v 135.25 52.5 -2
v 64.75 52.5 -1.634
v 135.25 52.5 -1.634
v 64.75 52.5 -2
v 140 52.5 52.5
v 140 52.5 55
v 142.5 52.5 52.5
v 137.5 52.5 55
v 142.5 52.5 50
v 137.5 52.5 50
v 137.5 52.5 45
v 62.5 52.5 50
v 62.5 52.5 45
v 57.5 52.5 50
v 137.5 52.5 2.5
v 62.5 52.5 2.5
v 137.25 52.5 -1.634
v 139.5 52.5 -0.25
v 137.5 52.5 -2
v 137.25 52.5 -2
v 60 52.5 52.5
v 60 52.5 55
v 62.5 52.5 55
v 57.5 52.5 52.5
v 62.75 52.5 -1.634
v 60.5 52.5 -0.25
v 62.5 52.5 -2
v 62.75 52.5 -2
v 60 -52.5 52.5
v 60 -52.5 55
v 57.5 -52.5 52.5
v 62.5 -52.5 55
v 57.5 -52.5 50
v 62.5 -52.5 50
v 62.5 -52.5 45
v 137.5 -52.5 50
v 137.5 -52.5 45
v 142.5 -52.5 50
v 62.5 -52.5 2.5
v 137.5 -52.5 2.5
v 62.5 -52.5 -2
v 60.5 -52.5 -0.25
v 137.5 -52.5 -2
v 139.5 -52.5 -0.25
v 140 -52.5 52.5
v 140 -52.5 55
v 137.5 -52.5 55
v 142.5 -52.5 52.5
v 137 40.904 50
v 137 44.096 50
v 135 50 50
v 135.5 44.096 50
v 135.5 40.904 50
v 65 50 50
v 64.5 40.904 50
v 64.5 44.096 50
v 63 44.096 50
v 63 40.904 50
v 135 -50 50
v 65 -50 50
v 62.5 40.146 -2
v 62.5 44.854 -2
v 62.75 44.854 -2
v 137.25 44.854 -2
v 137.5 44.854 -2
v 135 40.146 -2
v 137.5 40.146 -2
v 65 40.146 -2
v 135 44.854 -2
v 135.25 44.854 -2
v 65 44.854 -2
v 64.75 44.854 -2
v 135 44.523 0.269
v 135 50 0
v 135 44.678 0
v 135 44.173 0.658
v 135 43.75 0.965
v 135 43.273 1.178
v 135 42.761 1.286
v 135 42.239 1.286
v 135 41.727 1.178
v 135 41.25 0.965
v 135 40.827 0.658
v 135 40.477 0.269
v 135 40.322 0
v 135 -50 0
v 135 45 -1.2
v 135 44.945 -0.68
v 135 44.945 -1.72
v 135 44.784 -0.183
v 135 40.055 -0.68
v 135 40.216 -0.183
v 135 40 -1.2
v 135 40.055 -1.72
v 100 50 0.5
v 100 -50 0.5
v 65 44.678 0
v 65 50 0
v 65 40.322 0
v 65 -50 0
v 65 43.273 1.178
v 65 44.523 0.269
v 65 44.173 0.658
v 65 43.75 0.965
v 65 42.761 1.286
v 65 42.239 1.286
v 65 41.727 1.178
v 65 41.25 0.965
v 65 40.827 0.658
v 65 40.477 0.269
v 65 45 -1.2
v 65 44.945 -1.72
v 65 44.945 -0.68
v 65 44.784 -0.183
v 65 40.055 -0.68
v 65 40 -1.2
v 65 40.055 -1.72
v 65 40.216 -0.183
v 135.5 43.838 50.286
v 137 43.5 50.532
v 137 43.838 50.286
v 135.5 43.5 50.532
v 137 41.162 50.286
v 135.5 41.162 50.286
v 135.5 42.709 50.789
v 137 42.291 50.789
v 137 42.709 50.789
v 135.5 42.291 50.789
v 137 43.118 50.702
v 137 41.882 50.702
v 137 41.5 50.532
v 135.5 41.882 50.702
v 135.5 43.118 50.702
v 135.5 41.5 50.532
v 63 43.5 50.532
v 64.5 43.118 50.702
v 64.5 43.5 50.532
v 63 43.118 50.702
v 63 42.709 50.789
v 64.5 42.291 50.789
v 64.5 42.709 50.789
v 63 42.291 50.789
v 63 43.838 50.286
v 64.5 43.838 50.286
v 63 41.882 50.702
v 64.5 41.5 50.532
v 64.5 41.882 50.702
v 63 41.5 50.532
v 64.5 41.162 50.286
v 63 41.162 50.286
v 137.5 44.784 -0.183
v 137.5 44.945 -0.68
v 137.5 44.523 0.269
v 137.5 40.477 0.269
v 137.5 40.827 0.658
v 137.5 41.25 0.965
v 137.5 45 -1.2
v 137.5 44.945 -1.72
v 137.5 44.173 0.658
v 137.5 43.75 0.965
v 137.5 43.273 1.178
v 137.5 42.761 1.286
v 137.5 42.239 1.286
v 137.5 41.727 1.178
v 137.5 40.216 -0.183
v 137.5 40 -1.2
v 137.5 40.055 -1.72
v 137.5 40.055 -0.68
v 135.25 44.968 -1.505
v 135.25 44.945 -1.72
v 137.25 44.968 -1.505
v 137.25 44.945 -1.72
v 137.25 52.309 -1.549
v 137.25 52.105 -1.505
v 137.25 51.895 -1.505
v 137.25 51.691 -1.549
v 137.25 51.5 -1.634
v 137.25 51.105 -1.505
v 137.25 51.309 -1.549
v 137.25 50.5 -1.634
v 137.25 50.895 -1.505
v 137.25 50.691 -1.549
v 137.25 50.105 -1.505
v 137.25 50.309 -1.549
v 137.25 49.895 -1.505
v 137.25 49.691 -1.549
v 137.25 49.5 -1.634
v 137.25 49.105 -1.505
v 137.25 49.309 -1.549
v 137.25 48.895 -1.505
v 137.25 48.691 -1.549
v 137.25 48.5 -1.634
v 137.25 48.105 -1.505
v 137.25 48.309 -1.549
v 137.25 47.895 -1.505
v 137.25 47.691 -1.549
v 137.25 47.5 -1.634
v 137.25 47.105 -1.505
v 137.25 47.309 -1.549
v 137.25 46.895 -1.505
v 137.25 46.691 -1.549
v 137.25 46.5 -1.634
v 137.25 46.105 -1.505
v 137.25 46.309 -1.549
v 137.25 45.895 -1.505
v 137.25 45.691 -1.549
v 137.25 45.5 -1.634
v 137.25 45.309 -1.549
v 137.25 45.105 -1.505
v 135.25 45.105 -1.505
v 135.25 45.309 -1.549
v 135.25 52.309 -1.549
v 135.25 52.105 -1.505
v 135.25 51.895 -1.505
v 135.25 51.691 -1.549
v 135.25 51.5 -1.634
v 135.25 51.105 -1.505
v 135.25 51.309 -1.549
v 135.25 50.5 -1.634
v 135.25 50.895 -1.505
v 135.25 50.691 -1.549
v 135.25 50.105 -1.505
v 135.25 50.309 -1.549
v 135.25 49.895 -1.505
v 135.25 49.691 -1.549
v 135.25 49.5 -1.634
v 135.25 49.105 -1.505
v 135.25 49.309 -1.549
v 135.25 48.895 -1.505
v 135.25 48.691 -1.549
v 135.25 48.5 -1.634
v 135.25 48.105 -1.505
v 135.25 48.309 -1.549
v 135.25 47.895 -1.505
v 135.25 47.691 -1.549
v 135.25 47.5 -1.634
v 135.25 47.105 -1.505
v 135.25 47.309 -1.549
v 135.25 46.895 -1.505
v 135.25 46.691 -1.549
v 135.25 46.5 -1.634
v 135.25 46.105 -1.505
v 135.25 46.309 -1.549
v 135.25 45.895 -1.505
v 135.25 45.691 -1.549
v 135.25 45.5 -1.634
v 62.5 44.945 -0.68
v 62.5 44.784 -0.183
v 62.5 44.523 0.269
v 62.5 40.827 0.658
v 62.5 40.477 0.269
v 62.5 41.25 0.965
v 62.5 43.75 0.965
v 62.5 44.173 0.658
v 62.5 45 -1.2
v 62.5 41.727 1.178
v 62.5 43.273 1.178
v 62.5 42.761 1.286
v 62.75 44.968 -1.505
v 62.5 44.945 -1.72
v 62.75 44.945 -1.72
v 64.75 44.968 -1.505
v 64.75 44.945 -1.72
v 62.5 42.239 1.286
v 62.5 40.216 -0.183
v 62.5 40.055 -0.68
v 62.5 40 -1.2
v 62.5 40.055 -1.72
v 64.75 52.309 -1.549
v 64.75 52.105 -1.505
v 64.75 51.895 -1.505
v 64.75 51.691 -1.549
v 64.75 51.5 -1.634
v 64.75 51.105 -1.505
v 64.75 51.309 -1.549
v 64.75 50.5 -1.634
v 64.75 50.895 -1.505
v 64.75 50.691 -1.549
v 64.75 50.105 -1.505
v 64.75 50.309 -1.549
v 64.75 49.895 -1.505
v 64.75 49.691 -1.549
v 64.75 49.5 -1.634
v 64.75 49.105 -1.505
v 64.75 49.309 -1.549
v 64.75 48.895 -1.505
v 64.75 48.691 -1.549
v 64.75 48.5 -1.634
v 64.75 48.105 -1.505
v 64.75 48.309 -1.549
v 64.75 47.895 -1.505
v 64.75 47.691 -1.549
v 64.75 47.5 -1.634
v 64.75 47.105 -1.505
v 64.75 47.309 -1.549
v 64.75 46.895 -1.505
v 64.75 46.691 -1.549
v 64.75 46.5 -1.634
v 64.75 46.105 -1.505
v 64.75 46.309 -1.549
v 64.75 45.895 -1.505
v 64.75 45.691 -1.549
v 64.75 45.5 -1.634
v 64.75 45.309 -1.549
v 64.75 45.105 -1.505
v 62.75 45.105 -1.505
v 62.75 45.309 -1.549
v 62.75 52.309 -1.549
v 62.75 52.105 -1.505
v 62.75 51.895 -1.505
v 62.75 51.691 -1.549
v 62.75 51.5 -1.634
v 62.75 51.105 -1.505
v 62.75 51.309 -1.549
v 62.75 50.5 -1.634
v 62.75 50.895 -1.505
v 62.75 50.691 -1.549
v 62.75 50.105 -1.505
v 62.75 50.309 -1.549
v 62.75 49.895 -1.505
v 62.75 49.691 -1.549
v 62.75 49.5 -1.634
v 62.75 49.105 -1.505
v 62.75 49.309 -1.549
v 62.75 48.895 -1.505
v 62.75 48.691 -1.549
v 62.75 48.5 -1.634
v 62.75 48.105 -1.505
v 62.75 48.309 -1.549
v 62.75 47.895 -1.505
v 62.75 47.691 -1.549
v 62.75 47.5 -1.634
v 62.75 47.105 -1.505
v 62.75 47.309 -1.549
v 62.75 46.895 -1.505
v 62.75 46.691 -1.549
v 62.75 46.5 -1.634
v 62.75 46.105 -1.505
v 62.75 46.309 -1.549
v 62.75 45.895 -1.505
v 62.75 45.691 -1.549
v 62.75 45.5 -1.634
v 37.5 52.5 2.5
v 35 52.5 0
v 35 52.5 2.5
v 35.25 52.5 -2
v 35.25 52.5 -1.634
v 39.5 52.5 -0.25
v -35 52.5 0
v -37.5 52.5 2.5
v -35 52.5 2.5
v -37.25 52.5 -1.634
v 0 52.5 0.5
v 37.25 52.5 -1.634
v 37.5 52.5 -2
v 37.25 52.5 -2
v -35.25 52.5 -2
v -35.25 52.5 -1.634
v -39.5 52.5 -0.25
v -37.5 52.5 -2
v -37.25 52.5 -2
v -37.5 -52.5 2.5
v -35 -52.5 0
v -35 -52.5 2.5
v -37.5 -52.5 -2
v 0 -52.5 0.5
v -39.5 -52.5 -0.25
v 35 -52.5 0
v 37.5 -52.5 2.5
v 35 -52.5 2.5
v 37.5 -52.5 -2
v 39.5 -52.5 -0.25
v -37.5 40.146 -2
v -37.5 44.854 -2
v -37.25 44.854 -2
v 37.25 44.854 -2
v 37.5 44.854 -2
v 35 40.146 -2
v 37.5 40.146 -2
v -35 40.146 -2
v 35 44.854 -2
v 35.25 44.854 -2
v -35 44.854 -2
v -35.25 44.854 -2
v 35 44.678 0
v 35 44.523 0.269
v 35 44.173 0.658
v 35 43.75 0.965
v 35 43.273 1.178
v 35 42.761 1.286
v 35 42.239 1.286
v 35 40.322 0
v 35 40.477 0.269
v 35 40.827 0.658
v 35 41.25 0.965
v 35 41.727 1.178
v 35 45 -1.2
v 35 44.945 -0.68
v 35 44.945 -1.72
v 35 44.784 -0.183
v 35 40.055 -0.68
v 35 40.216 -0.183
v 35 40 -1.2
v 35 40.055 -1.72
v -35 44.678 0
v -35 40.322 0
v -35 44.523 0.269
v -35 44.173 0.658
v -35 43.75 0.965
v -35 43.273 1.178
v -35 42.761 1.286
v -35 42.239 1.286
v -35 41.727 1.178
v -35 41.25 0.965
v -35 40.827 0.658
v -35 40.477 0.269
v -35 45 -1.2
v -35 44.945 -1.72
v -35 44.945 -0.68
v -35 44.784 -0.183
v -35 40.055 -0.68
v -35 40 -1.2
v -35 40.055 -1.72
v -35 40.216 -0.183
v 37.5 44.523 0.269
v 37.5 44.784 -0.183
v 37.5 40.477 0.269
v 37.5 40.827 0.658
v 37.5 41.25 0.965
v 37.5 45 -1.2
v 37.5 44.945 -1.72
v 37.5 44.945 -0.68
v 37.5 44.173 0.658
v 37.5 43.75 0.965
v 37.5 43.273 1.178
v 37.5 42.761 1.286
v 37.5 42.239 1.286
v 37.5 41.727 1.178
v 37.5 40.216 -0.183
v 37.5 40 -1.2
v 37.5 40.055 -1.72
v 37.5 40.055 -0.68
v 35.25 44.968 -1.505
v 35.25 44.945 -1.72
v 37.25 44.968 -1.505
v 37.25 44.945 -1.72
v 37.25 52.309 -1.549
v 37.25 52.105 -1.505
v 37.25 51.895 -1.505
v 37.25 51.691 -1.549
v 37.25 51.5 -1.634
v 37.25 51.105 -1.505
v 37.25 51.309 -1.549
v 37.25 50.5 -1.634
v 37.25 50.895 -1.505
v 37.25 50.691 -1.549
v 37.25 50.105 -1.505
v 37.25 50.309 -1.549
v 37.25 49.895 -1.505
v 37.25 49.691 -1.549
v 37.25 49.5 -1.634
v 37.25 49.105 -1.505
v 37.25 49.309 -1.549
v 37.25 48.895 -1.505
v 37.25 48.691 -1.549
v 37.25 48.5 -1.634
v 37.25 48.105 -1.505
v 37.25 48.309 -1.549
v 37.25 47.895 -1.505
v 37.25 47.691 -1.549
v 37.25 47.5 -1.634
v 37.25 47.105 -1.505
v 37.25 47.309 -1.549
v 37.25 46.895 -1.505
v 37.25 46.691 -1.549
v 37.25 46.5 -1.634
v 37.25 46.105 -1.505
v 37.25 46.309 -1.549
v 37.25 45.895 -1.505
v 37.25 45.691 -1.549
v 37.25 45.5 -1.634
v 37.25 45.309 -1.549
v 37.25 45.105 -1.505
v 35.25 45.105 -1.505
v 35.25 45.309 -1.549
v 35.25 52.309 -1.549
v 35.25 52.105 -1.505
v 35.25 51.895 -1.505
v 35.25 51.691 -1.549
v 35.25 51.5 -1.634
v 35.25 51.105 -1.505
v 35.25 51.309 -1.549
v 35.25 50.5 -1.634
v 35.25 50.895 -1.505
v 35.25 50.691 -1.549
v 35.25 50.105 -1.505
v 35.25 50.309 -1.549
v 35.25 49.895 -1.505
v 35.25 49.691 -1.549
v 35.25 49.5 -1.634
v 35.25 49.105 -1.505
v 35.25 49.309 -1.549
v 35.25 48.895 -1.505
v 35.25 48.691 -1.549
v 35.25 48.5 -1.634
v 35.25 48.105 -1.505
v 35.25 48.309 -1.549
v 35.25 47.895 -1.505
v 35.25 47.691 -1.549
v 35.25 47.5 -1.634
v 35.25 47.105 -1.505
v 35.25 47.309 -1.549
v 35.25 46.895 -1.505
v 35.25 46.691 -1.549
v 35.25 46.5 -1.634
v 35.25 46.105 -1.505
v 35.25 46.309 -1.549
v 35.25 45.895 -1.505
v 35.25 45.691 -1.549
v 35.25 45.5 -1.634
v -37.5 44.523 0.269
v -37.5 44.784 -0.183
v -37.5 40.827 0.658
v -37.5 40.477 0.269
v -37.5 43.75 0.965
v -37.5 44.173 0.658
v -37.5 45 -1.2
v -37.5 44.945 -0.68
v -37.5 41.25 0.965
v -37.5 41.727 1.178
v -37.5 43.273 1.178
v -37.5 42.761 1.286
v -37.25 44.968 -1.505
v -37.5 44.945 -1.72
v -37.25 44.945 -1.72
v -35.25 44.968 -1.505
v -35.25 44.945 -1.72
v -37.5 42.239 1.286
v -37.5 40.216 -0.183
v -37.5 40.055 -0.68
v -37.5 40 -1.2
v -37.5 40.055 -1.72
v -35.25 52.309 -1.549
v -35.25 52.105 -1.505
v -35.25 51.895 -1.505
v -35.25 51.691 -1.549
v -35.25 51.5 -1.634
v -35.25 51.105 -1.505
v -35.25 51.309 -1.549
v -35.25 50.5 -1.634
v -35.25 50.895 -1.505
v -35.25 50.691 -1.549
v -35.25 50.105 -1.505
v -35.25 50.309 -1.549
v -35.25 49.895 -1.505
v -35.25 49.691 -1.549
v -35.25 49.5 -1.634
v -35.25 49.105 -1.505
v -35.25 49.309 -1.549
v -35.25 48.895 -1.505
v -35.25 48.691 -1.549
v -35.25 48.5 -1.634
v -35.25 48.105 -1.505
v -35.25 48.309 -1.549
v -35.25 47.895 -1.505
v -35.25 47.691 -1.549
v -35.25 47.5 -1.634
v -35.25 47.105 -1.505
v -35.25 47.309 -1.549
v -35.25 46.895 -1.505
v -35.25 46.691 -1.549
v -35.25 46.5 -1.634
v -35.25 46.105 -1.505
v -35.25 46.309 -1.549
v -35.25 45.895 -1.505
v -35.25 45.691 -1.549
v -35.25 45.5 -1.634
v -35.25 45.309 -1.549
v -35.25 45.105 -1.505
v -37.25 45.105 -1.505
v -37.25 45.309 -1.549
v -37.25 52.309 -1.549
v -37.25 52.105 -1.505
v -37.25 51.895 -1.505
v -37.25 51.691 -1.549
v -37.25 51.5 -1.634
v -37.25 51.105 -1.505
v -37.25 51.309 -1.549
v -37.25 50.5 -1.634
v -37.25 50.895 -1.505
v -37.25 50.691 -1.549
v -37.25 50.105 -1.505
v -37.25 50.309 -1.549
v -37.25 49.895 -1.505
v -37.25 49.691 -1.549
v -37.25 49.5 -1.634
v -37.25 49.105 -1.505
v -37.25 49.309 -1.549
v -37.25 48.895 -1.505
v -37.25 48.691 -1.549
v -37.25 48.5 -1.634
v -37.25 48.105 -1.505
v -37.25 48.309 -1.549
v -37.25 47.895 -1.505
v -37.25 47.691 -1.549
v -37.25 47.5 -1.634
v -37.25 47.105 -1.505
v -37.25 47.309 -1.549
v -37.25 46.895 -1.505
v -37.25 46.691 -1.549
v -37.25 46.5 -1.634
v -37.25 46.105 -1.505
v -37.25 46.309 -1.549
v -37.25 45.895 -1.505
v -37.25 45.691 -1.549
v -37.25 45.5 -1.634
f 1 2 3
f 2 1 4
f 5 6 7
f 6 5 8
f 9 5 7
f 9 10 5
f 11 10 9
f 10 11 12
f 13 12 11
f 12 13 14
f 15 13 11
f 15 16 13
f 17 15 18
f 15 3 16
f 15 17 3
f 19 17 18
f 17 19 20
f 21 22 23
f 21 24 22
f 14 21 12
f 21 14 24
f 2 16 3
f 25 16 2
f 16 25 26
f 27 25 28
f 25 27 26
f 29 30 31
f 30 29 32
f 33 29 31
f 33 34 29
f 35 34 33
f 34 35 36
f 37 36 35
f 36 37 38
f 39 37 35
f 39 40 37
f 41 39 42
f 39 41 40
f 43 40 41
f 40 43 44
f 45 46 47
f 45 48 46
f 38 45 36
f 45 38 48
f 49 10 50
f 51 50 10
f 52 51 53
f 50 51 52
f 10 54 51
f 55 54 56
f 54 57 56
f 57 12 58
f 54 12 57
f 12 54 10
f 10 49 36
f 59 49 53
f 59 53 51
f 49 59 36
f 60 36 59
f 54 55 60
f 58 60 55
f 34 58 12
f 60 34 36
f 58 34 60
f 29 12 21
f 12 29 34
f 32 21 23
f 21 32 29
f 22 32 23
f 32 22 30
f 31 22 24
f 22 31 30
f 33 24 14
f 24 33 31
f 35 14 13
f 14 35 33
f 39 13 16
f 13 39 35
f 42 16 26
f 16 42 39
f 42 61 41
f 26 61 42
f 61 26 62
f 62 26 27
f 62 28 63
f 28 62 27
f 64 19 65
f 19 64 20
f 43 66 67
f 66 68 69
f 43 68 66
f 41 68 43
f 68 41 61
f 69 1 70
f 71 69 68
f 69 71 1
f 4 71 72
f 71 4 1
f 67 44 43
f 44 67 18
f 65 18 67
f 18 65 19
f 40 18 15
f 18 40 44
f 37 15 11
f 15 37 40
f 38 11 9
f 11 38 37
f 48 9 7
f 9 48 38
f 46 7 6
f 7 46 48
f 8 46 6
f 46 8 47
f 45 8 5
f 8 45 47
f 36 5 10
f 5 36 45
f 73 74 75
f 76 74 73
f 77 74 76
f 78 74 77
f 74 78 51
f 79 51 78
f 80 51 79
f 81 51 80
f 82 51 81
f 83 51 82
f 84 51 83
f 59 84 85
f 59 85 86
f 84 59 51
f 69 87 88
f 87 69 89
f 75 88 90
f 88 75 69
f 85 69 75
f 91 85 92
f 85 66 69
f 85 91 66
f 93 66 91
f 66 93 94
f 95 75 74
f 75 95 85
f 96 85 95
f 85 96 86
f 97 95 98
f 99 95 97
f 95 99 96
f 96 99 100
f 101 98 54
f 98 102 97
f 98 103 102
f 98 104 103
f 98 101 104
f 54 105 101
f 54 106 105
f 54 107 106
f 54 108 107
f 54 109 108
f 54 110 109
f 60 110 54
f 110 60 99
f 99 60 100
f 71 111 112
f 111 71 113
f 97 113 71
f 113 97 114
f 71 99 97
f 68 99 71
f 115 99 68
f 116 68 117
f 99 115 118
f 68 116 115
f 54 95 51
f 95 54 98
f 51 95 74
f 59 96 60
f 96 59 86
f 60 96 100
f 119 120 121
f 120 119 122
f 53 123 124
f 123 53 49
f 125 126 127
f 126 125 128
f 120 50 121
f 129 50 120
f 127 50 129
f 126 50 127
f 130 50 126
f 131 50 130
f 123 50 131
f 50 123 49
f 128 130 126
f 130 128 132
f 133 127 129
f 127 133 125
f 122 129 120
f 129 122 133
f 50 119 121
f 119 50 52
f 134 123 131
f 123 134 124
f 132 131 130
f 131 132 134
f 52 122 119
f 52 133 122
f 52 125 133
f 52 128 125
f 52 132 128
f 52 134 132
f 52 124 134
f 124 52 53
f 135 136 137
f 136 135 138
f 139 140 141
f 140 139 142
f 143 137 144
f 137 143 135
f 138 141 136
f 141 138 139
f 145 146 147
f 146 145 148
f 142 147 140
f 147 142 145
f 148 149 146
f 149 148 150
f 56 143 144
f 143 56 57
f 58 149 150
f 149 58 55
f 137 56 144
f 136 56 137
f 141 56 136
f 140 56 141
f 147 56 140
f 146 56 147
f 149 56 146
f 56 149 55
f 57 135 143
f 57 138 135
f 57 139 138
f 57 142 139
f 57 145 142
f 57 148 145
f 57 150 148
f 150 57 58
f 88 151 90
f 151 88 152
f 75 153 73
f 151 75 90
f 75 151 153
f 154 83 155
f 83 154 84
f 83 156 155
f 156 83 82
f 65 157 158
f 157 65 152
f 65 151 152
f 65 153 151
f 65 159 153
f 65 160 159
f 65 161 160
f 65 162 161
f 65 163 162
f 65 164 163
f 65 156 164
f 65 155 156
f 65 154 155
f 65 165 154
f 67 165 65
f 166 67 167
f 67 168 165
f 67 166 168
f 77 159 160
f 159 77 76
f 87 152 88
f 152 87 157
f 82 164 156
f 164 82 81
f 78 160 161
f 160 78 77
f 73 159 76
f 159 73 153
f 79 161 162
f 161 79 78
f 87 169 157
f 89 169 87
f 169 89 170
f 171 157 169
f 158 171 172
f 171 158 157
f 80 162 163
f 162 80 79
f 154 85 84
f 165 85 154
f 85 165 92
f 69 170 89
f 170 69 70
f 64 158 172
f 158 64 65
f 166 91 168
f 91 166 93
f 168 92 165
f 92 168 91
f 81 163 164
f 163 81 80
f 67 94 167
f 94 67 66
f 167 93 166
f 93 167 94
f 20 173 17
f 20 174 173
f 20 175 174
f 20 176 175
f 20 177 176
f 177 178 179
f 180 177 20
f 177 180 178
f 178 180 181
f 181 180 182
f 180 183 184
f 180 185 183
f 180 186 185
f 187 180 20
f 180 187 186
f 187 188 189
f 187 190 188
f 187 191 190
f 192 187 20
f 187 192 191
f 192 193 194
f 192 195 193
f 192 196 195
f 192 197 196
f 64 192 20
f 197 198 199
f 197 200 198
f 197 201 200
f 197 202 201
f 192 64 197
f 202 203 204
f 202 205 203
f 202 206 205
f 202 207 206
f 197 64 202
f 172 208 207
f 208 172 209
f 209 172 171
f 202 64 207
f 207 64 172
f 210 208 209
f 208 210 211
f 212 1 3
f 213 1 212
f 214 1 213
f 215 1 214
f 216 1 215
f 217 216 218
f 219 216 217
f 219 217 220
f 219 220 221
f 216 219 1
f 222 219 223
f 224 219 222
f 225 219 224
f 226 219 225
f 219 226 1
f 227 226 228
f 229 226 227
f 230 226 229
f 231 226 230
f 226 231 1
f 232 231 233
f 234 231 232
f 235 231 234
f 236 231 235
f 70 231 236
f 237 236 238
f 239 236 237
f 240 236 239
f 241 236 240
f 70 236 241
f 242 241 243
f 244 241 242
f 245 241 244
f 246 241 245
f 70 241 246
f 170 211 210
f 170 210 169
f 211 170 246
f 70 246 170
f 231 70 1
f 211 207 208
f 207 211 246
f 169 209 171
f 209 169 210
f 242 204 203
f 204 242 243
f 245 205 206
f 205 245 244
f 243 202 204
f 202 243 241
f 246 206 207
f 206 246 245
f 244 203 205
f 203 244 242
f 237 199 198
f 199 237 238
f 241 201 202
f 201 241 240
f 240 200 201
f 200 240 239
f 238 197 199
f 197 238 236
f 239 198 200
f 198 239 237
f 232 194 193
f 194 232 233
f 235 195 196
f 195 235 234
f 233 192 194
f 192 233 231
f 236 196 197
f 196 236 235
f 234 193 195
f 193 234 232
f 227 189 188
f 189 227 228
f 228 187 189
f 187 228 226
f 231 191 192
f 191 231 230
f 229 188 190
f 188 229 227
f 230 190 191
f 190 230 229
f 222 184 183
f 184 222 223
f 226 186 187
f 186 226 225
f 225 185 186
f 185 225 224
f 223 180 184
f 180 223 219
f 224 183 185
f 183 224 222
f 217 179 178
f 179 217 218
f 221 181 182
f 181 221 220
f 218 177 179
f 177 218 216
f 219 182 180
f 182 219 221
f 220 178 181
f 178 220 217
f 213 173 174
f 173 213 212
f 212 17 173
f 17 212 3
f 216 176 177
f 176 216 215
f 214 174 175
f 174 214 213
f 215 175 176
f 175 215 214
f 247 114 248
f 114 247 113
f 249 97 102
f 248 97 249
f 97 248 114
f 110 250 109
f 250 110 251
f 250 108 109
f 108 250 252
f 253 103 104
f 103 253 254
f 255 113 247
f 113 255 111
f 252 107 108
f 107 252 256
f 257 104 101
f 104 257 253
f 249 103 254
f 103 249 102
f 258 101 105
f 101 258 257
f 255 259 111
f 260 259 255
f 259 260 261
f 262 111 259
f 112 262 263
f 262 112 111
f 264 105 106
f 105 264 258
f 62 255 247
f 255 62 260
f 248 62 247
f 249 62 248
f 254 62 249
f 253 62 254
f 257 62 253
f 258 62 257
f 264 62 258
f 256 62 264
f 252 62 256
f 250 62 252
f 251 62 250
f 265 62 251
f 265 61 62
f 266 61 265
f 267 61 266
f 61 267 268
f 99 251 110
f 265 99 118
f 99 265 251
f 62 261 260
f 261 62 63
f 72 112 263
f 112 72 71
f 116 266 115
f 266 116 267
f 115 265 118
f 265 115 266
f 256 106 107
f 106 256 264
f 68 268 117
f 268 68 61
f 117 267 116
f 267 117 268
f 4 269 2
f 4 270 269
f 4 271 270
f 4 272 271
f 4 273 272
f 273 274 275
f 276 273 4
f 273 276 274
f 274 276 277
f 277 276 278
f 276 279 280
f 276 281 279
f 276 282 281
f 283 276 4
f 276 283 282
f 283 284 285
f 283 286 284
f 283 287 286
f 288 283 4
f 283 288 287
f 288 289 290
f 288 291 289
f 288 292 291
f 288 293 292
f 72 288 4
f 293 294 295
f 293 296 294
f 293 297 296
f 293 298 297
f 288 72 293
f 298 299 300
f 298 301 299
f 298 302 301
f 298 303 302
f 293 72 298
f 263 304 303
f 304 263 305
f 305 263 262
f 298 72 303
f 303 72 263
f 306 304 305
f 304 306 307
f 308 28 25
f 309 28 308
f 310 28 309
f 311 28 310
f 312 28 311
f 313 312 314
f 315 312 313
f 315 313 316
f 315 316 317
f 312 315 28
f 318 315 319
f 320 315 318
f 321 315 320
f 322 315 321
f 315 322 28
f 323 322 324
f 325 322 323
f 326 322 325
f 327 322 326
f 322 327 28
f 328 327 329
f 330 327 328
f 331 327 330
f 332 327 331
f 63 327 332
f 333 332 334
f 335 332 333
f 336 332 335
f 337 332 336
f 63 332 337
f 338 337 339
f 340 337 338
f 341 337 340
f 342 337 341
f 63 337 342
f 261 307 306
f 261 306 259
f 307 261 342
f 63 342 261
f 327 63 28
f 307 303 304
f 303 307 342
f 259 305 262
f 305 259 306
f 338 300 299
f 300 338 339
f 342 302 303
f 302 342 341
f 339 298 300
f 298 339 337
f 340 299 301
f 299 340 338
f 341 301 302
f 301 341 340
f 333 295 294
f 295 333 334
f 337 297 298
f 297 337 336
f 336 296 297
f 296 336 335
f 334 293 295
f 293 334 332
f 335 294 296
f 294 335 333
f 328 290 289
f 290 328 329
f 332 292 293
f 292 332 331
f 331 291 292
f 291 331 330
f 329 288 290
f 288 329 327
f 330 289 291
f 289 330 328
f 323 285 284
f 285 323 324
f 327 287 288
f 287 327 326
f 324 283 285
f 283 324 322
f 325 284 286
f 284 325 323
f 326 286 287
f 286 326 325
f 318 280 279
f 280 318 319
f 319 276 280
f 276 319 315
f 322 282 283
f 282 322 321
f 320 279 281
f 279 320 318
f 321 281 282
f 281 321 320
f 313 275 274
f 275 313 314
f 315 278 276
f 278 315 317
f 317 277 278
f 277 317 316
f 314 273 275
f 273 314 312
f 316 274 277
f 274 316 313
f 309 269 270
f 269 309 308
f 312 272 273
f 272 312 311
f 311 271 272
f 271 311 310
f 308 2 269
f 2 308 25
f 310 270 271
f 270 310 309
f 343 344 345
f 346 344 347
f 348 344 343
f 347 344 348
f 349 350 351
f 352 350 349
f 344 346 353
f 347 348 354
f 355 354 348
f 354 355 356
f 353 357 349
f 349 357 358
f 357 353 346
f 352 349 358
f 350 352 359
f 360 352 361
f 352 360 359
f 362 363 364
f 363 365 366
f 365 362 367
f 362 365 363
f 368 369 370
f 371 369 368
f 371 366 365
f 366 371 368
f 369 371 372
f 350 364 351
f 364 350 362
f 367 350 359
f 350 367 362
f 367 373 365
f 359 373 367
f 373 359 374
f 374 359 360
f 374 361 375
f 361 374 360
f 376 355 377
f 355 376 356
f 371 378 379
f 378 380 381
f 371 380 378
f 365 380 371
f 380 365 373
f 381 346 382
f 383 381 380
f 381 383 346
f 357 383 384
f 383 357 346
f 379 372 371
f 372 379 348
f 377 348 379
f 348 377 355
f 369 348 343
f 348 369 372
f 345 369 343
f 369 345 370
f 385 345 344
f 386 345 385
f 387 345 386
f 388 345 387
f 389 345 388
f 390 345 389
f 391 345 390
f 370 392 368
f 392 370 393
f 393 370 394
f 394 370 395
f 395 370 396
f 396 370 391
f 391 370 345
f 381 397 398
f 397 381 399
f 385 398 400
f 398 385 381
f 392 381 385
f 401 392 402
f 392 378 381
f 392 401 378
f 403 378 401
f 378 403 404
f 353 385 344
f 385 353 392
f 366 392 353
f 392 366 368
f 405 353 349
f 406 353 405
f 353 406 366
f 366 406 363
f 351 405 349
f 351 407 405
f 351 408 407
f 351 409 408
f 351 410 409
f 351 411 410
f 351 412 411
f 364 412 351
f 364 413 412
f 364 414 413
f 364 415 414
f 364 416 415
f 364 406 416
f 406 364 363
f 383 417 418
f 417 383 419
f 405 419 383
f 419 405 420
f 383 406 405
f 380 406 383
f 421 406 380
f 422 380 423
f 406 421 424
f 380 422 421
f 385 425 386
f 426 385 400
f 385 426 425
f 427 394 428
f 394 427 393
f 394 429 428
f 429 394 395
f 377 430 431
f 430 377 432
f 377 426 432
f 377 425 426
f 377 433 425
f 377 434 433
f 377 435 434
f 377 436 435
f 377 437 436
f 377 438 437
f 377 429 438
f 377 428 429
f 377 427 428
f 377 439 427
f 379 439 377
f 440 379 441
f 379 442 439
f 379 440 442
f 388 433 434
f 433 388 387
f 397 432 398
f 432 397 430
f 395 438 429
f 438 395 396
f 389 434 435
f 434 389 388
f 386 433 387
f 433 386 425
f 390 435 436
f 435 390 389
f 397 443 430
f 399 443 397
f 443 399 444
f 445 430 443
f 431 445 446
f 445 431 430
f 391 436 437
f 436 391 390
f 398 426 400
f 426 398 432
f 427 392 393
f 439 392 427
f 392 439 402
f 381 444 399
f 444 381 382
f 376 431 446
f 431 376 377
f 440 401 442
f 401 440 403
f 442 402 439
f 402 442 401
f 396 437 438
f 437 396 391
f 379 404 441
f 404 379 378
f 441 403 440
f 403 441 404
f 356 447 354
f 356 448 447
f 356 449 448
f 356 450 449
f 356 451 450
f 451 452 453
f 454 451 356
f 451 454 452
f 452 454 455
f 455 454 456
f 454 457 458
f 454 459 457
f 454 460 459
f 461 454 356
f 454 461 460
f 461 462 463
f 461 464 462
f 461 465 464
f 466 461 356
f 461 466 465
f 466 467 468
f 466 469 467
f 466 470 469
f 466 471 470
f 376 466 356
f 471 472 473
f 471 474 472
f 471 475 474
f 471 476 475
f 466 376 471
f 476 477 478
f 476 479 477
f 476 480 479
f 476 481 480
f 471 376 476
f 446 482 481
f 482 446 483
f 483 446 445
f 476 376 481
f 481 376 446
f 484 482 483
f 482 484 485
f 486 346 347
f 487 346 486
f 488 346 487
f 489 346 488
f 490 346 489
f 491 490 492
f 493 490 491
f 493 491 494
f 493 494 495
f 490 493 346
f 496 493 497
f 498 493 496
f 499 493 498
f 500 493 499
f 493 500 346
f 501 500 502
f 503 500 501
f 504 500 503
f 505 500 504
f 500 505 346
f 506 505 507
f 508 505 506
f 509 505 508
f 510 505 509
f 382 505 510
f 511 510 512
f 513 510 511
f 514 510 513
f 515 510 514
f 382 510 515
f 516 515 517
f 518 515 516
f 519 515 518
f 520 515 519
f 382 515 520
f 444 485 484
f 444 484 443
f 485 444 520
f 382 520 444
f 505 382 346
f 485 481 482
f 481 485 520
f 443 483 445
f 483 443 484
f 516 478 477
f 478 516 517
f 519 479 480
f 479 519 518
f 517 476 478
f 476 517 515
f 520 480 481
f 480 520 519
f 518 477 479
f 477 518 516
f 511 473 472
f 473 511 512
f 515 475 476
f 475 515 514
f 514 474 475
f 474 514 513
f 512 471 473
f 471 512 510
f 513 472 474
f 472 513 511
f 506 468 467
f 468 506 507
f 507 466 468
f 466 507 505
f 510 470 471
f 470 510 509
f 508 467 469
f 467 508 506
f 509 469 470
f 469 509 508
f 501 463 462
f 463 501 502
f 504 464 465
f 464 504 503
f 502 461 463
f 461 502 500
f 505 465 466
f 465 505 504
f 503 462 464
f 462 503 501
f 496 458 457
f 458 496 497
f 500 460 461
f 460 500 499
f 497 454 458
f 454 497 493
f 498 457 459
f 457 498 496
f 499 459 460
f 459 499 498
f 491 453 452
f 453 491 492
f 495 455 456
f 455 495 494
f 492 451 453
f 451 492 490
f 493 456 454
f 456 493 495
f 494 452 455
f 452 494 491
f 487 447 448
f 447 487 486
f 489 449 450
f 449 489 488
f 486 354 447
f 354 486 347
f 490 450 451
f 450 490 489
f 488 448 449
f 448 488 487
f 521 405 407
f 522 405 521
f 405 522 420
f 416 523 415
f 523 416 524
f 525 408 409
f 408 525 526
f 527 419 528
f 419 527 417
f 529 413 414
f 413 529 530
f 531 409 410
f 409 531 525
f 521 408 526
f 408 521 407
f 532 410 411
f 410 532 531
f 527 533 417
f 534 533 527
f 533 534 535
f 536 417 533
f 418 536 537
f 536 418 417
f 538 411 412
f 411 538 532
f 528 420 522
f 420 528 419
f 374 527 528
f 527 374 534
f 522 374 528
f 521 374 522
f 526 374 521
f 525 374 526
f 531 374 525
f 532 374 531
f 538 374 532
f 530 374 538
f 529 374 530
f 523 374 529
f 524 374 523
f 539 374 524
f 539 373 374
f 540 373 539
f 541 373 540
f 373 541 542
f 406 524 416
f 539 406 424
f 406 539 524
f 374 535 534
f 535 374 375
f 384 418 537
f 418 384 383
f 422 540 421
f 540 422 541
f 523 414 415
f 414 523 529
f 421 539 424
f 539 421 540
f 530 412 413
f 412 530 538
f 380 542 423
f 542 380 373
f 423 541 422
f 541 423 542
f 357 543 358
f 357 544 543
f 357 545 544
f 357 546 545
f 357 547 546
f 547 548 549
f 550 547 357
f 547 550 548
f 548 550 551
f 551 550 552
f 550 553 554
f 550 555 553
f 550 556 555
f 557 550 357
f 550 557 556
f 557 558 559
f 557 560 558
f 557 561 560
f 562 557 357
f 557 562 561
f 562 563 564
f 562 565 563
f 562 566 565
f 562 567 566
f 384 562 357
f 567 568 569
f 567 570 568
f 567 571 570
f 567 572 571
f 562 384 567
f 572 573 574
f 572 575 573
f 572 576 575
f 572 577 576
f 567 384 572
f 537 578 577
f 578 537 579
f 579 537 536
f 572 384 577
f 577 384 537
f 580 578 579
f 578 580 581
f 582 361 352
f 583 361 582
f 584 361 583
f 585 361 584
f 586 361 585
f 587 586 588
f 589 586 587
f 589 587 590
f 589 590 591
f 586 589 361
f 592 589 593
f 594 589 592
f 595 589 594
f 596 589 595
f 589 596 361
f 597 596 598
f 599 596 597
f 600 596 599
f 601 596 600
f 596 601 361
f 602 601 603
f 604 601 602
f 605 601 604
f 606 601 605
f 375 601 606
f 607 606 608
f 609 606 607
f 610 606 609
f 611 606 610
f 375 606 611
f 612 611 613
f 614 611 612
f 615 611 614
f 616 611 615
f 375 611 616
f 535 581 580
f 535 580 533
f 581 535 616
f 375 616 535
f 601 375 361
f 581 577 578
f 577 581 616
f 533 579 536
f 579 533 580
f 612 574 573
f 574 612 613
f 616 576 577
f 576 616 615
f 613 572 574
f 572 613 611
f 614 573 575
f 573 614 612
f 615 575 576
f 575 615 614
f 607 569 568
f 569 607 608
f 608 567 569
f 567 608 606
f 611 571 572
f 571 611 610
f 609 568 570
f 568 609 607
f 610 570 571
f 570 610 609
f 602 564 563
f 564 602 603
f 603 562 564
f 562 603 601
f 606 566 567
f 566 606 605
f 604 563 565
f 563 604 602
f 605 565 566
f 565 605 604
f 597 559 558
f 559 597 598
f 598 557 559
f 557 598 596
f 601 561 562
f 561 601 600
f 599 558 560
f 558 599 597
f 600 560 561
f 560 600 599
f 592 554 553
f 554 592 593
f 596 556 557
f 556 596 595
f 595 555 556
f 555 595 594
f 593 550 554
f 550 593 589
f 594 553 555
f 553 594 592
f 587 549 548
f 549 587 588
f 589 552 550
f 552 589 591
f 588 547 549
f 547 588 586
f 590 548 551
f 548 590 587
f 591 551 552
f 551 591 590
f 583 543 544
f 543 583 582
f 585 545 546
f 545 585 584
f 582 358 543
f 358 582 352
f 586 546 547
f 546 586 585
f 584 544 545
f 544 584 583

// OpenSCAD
module card_box(card_x, card_y, thickness, inner_height) {
    p1 = [0,0];
    p2 = p1 + [0, inner_height];
    p3 = p2 + [-thickness, 0];
    p4 = p3 + [-thickness, thickness];
    p5 = p4 + [thickness, thickness];
    p6 = p5 + [-thickness, 0];
    p7 = p6 + [-thickness, -thickness];
    p8 = p7 + [0, -thickness];
    p9 = p8 + [2*thickness, -2*thickness];
    p10 = p9 + [0, -inner_height+(3*thickness)];
    p11 = p10 + [-thickness*0.8, -thickness*1.1];
    p12 = p10 + [0, -1.8*thickness];
    p13 = p12 + [thickness+card_x/2,0];
    p14 = p13 + [0, thickness];

    p=[p1,p2,p3,p4,p5,p6,p7,p8,p9,p10,p11,p12,p13,p14];
    difference() {
        union() {
            linear_extrude(height = card_y+2*thickness, center=true) {
                union() {
                    translate([-card_x/2,0,0]) polygon(points=p);
                    mirror([1,0,0]) translate([-card_x/2,0,0]) polygon(points=p);
                }
            }
            translate([0,inner_height/2,-card_y/2-thickness/2]) cube(size=[card_x, inner_height, thickness], center=true);
            translate([0,inner_height/2,card_y/2+thickness/2]) cube(size=[card_x, inner_height, thickness], center=true);
            translate([card_x/2+thickness/2, inner_height-1.2, (-card_y/2)*0.85]) rotate([0,90,0]) cylinder(h=thickness*0.6, r=2, center=true, $fn=30);
            translate([-card_x/2-thickness/2, inner_height-1.2, (-card_y/2)*0.85]) rotate([0,90,0]) cylinder(h=thickness*0.6, r=2, center=true, $fn=30);
        }
        //translate([card_x/2+thickness/2, -1.2, (-card_y/2)*0.85]) rotate([0,90,0]) cylinder(h=thickness*1.5, r=2.5, center=true, $fn=30);
        //translate([-card_x/2-thickness/2, -1.2, (-card_y/2)*0.85]) rotate([0,90,0]) cylinder(h=thickness*1.5, r=2.5, center=true, $fn=30);
                translate([card_x/2+thickness/2, -1.2, (-card_y/2)*0.85]) rotate([0,90,0]) cylinder(h=thickness, r=2.5, center=true, $fn=30);
        translate([card_x/2+thickness/2, -2.5, (-card_y/2)*0.9]) rotate([0,90,0]) cylinder(h=thickness*0.8, r=1, center=true, $fn=30);
        translate([card_x/2+thickness/2, -2.5, (-card_y/2)*0.92]) rotate([0,90,0]) cylinder(h=thickness*0.8, r=1, center=true, $fn=30);
        translate([card_x/2+thickness/2, -2.5, (-card_y/2)*0.94]) rotate([0,90,0]) cylinder(h=thickness*0.8, r=1, center=true, $fn=30);
        translate([card_x/2+thickness/2, -2.5, (-card_y/2)*0.96]) rotate([0,90,0]) cylinder(h=thickness*0.8, r=1, center=true, $fn=30);
        translate([card_x/2+thickness/2, -2.5, (-card_y/2)*0.98]) rotate([0,90,0]) cylinder(h=thickness*0.8, r=1, center=true, $fn=30);
        translate([card_x/2+thickness/2, -2.5, (-card_y/2)*1.00]) rotate([0,90,0]) cylinder(h=thickness*0.8, r=1, center=true, $fn=30);
        translate([card_x/2+thickness/2, -2.5, (-card_y/2)*1.02]) rotate([0,90,0]) cylinder(h=thickness*0.8, r=1, center=true, $fn=30);
        translate([card_x/2+thickness/2, -2.5, (-card_y/2)*1.04]) rotate([0,90,0]) cylinder(h=thickness*0.8, r=1, center=true, $fn=30);
        translate([-card_x/2-thickness/2, -1.2, (-card_y/2)*0.85]) rotate([0,90,0]) cylinder(h=thickness, r=2.5, center=true, $fn=30);
        translate([-card_x/2-thickness/2, -2.5, (-card_y/2)*0.9]) rotate([0,90,0]) cylinder(h=thickness*0.8, r=1, center=true, $fn=30);
        translate([-card_x/2-thickness/2, -2.5, (-card_y/2)*0.92]) rotate([0,90,0]) cylinder(h=thickness*0.8, r=1, center=true, $fn=30);
        translate([-card_x/2-thickness/2, -2.5, (-card_y/2)*0.94]) rotate([0,90,0]) cylinder(h=thickness*0.8, r=1, center=true, $fn=30);
        translate([-card_x/2-thickness/2, -2.5, (-card_y/2)*0.96]) rotate([0,90,0]) cylinder(h=thickness*0.8, r=1, center=true, $fn=30);
        translate([-card_x/2-thickness/2, -2.5, (-card_y/2)*0.98]) rotate([0,90,0]) cylinder(h=thickness*0.8, r=1, center=true, $fn=30);
        translate([-card_x/2-thickness/2, -2.5, (-card_y/2)*1.00]) rotate([0,90,0]) cylinder(h=thickness*0.8, r=1, center=true, $fn=30);
        translate([-card_x/2-thickness/2, -2.5, (-card_y/2)*1.02]) rotate([0,90,0]) cylinder(h=thickness*0.8, r=1, center=true, $fn=30);
        translate([-card_x/2-thickness/2, -2.5, (-card_y/2)*1.04]) rotate([0,90,0]) cylinder(h=thickness*0.8, r=1, center=true, $fn=30);
    }
}

module card_box_cap(card_x, card_y, thickness) {
    p1 = [0,0];
    p2 = p1 + [0,thickness];
    p3 = p2 +  [-thickness, 0];
    p4 = p3 + [-thickness*0.8, -thickness*1.1];
    p5 = p3 + [0, -1.8*thickness];
    p6 = p5 + [thickness+card_x/2,0];
    p7 = p6 + [0, thickness];
    
    p = [p1,p2,p3,p4,p5,p6,p7];
    
    difference() {
        union() {
            linear_extrude(height = card_y+2*thickness, center=true) {
                union() {
                    translate([-card_x/2,0,0]) polygon(points=p);
                    mirror([1,0,0]) translate([-card_x/2,0,0]) polygon(points=p);
                }
            }
        }
        translate([card_x/2+thickness/2, -1.2, (-card_y/2)*0.85]) rotate([0,90,0]) cylinder(h=thickness, r=2.5, center=true, $fn=30);
        translate([card_x/2+thickness/2, -2.5, (-card_y/2)*0.9]) rotate([0,90,0]) cylinder(h=thickness*0.8, r=1, center=true, $fn=30);
        translate([card_x/2+thickness/2, -2.5, (-card_y/2)*0.92]) rotate([0,90,0]) cylinder(h=thickness*0.8, r=1, center=true, $fn=30);
        translate([card_x/2+thickness/2, -2.5, (-card_y/2)*0.94]) rotate([0,90,0]) cylinder(h=thickness*0.8, r=1, center=true, $fn=30);
        translate([card_x/2+thickness/2, -2.5, (-card_y/2)*0.96]) rotate([0,90,0]) cylinder(h=thickness*0.8, r=1, center=true, $fn=30);
        translate([card_x/2+thickness/2, -2.5, (-card_y/2)*0.98]) rotate([0,90,0]) cylinder(h=thickness*0.8, r=1, center=true, $fn=30);
        translate([card_x/2+thickness/2, -2.5, (-card_y/2)*1.00]) rotate([0,90,0]) cylinder(h=thickness*0.8, r=1, center=true, $fn=30);
        translate([card_x/2+thickness/2, -2.5, (-card_y/2)*1.02]) rotate([0,90,0]) cylinder(h=thickness*0.8, r=1, center=true, $fn=30);
        translate([card_x/2+thickness/2, -2.5, (-card_y/2)*1.04]) rotate([0,90,0]) cylinder(h=thickness*0.8, r=1, center=true, $fn=30);
        translate([-card_x/2-thickness/2, -1.2, (-card_y/2)*0.85]) rotate([0,90,0]) cylinder(h=thickness, r=2.5, center=true, $fn=30);
        translate([-card_x/2-thickness/2, -2.5, (-card_y/2)*0.9]) rotate([0,90,0]) cylinder(h=thickness*0.8, r=1, center=true, $fn=30);
        translate([-card_x/2-thickness/2, -2.5, (-card_y/2)*0.92]) rotate([0,90,0]) cylinder(h=thickness*0.8, r=1, center=true, $fn=30);
        translate([-card_x/2-thickness/2, -2.5, (-card_y/2)*0.94]) rotate([0,90,0]) cylinder(h=thickness*0.8, r=1, center=true, $fn=30);
        translate([-card_x/2-thickness/2, -2.5, (-card_y/2)*0.96]) rotate([0,90,0]) cylinder(h=thickness*0.8, r=1, center=true, $fn=30);
        translate([-card_x/2-thickness/2, -2.5, (-card_y/2)*0.98]) rotate([0,90,0]) cylinder(h=thickness*0.8, r=1, center=true, $fn=30);
        translate([-card_x/2-thickness/2, -2.5, (-card_y/2)*1.00]) rotate([0,90,0]) cylinder(h=thickness*0.8, r=1, center=true, $fn=30);
        translate([-card_x/2-thickness/2, -2.5, (-card_y/2)*1.02]) rotate([0,90,0]) cylinder(h=thickness*0.8, r=1, center=true, $fn=30);
        translate([-card_x/2-thickness/2, -2.5, (-card_y/2)*1.04]) rotate([0,90,0]) cylinder(h=thickness*0.8, r=1, center=true, $fn=30);
        //translate([card_x/2+thickness/2, -1.2, (-card_y/2)*0.85]) cube([thickness*1.5,2,(card_y/2)*0.15], center=true);
    }
}
rotate([90,0,0]) {
    translate([100,0,0]) card_box(70,100,2.5,50);
    card_box_cap(70,100,2.5);
}
